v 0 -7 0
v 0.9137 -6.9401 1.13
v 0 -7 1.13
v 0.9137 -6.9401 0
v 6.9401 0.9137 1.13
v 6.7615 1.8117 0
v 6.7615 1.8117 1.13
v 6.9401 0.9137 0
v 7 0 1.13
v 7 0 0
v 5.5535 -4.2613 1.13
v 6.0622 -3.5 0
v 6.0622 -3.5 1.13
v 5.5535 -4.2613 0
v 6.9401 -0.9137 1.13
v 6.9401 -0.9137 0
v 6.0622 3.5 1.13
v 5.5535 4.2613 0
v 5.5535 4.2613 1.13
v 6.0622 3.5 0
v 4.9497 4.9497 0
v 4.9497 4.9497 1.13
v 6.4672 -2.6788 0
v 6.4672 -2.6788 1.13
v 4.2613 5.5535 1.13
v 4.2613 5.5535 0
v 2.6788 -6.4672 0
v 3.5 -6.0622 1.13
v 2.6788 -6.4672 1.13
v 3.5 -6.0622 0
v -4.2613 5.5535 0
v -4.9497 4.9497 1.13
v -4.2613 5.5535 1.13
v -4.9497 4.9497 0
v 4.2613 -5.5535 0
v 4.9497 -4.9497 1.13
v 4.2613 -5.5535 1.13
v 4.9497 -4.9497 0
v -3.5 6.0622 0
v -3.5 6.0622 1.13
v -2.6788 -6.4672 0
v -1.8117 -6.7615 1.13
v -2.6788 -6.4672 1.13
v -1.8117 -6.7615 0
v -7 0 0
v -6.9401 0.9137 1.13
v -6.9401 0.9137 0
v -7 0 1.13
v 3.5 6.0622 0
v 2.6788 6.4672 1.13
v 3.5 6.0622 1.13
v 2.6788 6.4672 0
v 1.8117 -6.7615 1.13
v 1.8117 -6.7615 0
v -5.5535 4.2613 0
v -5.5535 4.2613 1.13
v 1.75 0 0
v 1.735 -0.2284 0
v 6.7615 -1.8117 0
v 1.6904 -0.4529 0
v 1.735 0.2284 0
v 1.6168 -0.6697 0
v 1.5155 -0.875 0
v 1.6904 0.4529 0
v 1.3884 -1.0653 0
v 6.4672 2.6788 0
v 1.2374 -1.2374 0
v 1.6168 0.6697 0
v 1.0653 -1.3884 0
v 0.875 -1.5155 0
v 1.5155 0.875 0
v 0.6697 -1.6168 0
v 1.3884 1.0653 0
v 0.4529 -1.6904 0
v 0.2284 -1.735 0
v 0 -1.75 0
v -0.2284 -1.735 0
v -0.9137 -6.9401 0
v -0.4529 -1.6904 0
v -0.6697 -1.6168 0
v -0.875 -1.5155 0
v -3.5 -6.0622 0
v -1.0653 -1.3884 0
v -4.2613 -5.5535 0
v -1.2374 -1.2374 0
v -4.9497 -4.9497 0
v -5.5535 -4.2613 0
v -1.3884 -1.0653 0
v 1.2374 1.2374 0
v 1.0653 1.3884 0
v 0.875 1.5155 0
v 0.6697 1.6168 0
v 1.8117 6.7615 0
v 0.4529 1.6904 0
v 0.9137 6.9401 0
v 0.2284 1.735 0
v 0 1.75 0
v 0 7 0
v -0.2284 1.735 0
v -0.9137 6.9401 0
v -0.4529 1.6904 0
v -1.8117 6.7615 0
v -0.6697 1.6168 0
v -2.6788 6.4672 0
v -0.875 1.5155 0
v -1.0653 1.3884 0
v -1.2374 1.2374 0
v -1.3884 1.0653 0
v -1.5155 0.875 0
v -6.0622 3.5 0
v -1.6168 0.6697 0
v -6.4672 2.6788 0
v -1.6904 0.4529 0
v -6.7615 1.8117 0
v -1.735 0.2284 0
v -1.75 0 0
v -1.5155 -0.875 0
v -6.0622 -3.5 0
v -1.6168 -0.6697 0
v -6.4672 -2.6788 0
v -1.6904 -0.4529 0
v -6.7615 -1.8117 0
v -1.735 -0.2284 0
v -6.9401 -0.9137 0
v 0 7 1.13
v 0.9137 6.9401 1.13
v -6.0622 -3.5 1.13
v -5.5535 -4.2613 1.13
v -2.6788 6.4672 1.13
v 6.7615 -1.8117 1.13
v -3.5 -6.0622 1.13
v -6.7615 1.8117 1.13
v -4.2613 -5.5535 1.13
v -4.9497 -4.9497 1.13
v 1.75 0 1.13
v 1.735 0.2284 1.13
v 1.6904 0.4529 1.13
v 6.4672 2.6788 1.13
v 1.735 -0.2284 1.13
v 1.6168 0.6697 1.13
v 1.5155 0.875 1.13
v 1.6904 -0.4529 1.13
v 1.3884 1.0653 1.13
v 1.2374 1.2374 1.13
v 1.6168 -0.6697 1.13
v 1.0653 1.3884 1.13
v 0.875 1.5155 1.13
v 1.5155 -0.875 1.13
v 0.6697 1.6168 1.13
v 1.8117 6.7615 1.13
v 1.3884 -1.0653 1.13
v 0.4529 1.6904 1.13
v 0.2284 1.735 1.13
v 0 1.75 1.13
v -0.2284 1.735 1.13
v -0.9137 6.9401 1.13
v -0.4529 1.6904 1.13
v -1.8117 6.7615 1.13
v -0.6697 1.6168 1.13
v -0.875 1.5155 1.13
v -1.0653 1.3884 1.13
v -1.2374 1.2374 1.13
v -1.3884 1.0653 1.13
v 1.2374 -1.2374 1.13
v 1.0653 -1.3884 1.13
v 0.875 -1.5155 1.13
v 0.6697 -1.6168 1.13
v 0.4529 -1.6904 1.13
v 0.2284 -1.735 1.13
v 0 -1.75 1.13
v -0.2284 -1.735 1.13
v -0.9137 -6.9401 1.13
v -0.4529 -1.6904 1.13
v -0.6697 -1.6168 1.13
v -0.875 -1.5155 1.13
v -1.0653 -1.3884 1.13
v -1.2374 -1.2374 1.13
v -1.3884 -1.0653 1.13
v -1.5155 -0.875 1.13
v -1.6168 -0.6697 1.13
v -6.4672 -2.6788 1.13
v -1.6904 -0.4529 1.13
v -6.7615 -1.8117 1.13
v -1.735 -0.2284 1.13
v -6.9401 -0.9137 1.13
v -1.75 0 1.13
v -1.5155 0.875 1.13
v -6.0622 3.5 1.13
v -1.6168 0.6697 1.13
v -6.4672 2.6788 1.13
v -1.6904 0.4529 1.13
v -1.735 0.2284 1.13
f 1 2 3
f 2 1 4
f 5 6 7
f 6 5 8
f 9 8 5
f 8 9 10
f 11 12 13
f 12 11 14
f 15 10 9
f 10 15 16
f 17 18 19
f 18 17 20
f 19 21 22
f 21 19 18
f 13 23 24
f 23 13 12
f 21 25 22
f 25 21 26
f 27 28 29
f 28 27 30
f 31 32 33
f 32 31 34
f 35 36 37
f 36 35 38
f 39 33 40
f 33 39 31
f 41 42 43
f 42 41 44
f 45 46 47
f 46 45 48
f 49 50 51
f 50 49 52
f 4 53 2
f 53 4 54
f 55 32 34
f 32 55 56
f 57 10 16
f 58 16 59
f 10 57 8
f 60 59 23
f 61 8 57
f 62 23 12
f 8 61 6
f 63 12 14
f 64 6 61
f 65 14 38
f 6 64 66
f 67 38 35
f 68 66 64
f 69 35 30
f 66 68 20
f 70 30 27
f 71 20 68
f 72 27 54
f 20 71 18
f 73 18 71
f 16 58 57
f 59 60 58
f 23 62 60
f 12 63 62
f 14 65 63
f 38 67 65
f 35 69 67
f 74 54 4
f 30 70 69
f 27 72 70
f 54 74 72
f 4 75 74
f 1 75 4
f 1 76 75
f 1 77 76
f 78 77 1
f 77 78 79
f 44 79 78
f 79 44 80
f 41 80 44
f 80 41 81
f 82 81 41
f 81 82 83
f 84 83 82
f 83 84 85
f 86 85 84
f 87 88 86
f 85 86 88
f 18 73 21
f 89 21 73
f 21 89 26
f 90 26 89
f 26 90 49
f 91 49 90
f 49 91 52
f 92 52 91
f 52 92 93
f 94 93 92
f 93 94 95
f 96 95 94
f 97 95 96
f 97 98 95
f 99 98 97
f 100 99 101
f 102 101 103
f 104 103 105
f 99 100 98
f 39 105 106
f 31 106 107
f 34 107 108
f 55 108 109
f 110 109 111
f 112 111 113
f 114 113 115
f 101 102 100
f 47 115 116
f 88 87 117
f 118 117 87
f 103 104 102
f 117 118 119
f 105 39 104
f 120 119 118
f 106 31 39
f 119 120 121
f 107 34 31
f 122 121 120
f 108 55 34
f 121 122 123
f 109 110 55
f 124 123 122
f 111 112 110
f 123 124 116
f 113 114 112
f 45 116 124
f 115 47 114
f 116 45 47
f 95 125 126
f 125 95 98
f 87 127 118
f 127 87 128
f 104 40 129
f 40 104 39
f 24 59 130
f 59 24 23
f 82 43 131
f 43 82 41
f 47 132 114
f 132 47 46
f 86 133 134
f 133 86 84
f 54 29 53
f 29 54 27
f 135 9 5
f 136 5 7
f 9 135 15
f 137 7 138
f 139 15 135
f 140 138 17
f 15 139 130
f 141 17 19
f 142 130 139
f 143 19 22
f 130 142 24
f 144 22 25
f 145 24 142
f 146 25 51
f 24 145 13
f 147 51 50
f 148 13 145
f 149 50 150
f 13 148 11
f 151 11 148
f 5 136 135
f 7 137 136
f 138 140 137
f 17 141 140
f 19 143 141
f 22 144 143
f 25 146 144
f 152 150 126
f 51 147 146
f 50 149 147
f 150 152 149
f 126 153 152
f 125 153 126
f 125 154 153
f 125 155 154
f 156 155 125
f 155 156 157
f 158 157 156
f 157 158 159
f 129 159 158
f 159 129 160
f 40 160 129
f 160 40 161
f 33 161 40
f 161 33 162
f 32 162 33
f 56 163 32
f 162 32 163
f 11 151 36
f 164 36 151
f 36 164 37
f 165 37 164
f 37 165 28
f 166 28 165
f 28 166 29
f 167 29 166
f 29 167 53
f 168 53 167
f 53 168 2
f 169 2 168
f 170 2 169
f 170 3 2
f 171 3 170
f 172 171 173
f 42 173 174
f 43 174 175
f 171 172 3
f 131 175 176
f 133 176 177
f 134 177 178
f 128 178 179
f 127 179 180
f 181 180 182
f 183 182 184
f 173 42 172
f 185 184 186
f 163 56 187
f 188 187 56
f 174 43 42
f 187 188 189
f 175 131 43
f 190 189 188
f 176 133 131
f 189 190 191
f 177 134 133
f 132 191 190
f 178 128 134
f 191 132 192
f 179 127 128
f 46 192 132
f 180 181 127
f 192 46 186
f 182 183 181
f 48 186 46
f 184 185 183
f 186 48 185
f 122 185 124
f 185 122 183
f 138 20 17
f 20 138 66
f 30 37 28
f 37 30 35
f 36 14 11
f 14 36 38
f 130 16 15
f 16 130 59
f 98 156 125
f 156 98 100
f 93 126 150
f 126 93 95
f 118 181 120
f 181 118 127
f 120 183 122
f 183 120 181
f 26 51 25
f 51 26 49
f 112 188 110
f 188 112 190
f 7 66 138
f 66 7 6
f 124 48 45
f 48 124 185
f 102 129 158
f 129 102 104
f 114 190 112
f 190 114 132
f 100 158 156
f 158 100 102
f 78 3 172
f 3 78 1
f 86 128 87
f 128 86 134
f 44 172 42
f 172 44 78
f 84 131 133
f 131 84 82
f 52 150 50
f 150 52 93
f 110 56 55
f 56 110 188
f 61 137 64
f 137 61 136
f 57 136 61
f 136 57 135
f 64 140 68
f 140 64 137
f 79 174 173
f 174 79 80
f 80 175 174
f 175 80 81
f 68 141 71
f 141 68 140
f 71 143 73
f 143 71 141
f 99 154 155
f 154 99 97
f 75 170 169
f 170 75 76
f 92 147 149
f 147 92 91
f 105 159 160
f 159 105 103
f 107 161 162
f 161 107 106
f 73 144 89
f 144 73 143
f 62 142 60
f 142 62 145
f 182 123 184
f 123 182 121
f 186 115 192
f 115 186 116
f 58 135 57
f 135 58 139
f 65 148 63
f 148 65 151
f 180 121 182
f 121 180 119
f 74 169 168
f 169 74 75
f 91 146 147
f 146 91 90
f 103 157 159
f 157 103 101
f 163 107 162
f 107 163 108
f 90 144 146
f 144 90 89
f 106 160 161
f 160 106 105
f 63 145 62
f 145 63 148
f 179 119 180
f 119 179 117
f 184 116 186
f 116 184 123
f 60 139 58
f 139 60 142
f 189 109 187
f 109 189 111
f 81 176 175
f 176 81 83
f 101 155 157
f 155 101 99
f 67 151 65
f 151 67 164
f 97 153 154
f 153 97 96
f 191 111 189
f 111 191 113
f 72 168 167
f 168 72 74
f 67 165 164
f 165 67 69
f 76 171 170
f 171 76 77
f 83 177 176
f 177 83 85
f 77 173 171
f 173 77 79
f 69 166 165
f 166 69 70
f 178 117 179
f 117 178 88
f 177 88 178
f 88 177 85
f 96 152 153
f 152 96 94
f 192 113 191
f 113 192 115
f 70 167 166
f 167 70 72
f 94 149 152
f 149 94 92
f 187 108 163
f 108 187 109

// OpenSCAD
// file: parameters.scad
// =============================================================================
// Gen-AK Dual-rotor copper-centroid ultra AFPM — WOUND-AWARE (HARD GATE)
// PRIMARY challenger vs Gen-AH. Magnets @ R=40 + 190 t + former_web 1.40 → m2m 4.86.
// =============================================================================

// --- Wire / wind budget (26 AWG, ~1 lb spool ≈ 390 m bare-equiv) --------------
wire_awg            = 26;
wire_od             = 0.45;     // insulated OD mm
turns               = 190;      // +10 vs Gen-AH 180
fill                = 0.70;
layers_per_face     = 2;        // axial layers proud of EACH flange
wind_build_axial    = layers_per_face * wire_od * fill;   // 0.63 mm
wind_build_radial   = 3 * wire_od * fill;                 // 0.945 mm

// --- Pancake former (bare STL) -----------------------------------------------
coil_id_r           = 16.0;     // copper-centroid window centered ~R=40
coil_od_r           = 64.0;
span_deg            = 26.0;     // 12 stations × 30° pitch
former_web          = 1.40;     // thinner vs AH 1.50 (print-safe ≥0.8)
flange_t            = 0.60;
wall                = 1.2;
slot_w              = 2.4;
mount_hole          = 3.5;
tab_len             = 7.0;

former_bare_h       = former_web + 2 * flange_t;            // 2.60 mm
coil_envelope_h     = former_bare_h + 2 * wind_build_axial; // 3.86 mm

// --- Running clearance (magnet face → WOUND face) EACH side ------------------
run_clear           = 0.50;     // PASS floor ≥ 0.5
gap_spacer_h        = run_clear + wind_build_axial;         // 1.13 mm
m2m                 = coil_envelope_h + 2 * run_clear;      // 4.86 mm (beats Gen-AH 4.96)

// --- Mid stator (12 pancakes 3φ; winds proud both faces) ---------------------
coil_stations       = 12;
bay_r_in            = coil_id_r - 2.0 - wind_build_radial;
bay_r_out           = coil_od_r + 2.0 + wind_build_radial;
bay_span            = span_deg + 4.0;
bay_offset          = 2.0;
stator_thick        = former_bare_h;                        // winds proud ±Z
stator_od           = 160.0;
shaft_clear_stator  = 34.0;
coil_mount_r        = 26.0;

// --- Rotors (×2) — 8×Ø20 @ R=40 (copper centroid) + 24×Ø5 Halbach ------------
large_pocket_d      = 20.3;
small_pocket_d      = 5.3;
pocket_h            = 5.2;
large_n             = 8;
R_large             = 40.0;     // covers ~30–50 over copper centroid ~40
R_small_inner       = 25.0;
R_small_mid         = 40.0;
R_small_outer       = 57.0;
carrier_od          = 156.0;
carrier_thick       = 7.5;
hub_h               = 10.0;
hub_od              = 30.0;
rotor_b_offset_deg  = 22.5;

// --- Modular MAX interface (Gen-E family) ------------------------------------
shaft_bore          = 8.35;
bearing_d           = 21.85;
bearing_h           = 7.2;
m3_clear            = 3.5;
bolt_r_inner        = 36.0;
bolt_n_inner        = 6;
flange_bolt_r       = 72.0;
flange_bolt_n       = 6;
brace_r             = 68.0;
brace_d             = 4.3;
brace_n             = 4;

spacer_pad_od       = 14.0;
spacer_pad_id       = m3_clear;
endbell_od          = 160.0;
endbell_thick       = 8.0;
endbell_shaft_clear = 10.0;

$fn = 64;
// main file
// Gen-AK gap spacer — h = run_clear + wind_build_axial
include <parameters.scad>;
$fn = 48;
difference() {
    cylinder(d=spacer_pad_od, h=gap_spacer_h);
    translate([0, 0, -0.1]) cylinder(d=spacer_pad_id, h=gap_spacer_h + 0.2);
}
